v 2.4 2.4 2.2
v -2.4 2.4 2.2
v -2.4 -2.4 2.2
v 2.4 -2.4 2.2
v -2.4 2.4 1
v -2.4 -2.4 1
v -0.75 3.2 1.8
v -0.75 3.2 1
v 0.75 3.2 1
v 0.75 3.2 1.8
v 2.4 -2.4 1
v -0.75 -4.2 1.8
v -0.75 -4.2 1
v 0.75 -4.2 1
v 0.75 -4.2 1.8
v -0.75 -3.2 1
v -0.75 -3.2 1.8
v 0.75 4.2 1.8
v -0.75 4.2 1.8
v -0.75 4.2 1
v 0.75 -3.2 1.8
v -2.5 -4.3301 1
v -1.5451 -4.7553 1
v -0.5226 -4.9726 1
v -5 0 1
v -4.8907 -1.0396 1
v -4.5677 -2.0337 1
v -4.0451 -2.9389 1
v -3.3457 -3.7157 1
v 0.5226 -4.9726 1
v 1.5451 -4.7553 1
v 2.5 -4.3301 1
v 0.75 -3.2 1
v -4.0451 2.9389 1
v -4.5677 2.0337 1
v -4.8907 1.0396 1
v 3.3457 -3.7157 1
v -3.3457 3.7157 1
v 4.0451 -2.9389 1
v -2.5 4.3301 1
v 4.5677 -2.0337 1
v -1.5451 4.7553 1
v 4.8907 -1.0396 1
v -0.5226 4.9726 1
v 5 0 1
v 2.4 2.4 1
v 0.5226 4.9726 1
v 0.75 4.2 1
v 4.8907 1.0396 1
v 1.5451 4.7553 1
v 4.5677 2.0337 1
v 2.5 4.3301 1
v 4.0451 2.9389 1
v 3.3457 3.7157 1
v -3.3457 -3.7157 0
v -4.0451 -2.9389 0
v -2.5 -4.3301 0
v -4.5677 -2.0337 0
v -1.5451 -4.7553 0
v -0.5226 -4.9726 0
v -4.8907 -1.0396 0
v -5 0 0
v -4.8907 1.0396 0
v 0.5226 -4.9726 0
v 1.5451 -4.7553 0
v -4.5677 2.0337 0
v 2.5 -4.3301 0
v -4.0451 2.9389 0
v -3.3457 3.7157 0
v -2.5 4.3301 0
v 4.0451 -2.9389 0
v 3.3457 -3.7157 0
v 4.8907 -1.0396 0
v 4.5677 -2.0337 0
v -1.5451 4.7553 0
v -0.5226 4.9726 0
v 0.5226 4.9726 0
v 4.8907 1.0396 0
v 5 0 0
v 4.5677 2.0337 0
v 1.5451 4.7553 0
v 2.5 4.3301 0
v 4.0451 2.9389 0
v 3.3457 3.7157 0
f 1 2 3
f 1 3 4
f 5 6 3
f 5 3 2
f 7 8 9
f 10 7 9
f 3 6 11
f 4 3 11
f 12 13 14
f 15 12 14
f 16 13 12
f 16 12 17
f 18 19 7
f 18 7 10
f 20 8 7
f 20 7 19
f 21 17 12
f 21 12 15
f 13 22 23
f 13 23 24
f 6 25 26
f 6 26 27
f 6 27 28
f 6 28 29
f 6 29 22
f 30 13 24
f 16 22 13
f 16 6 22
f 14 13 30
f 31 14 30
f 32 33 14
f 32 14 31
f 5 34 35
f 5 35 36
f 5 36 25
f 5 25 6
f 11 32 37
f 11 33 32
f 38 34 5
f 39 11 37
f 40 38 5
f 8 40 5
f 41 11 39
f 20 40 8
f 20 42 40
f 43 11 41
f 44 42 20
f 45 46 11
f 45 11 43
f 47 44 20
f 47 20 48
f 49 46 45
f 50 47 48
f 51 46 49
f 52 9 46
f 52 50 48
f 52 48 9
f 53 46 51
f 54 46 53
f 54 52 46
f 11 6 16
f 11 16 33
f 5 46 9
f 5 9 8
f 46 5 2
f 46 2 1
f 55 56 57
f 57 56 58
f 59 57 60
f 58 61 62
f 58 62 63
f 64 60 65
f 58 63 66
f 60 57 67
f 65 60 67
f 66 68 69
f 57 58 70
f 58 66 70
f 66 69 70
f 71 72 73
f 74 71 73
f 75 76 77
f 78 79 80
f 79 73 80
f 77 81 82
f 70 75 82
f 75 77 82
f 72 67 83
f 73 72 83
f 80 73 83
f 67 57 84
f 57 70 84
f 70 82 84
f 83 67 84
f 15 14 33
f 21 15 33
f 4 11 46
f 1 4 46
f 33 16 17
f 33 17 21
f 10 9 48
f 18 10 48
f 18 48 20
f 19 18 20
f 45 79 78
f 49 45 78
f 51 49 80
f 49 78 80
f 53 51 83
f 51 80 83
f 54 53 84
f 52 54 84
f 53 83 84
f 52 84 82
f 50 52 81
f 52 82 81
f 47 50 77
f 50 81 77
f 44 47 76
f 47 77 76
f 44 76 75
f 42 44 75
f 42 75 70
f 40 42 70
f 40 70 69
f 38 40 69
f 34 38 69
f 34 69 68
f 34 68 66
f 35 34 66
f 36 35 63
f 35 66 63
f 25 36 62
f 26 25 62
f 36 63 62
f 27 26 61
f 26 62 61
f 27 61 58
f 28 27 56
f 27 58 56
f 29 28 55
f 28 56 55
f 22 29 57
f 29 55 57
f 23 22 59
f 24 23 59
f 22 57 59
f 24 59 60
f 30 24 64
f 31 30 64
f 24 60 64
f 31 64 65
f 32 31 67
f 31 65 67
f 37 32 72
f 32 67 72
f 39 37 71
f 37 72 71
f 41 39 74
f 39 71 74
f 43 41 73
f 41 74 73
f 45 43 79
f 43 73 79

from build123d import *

# Parameters (mm, degrees)
SKETCH1_R           = 5
BOSS_EXTRUDE1_DEPTH = 1
SKETCH2_W           = 4.8
SKETCH2_H           = 4.8
BOSS_EXTRUDE2_DEPTH = 1.2
SKETCH3_W           = 1.5
SKETCH3_H           = 1
SKETCH3_W_2         = 0.75
BOSS_EXTRUDE3_DEPTH = 0.8


with BuildPart() as part:
    # Sketch1 → Boss-Extrude1 (new body)
    with BuildSketch(Plane.XY):
        Circle(SKETCH1_R)
    extrude(amount=BOSS_EXTRUDE1_DEPTH)

    # Sketch2 → Boss-Extrude2 (add)
    with BuildSketch(Plane.XY.offset(1)):
        Rectangle(SKETCH2_W, SKETCH2_H)
    extrude(amount=BOSS_EXTRUDE2_DEPTH)

    # Sketch3 → Boss-Extrude3 (add)
    with BuildSketch(Plane.XY.offset(1)):
        with Locations((0, -3.7)):
            Rectangle(SKETCH3_W, SKETCH3_H)
        with Locations((0.375, 3.7)):
            Rectangle(SKETCH3_W_2, SKETCH3_H)
        with Locations((-0.375, 3.7)):
            Rectangle(SKETCH3_W_2, SKETCH3_H)
    extrude(amount=BOSS_EXTRUDE3_DEPTH)


solid = part.part
